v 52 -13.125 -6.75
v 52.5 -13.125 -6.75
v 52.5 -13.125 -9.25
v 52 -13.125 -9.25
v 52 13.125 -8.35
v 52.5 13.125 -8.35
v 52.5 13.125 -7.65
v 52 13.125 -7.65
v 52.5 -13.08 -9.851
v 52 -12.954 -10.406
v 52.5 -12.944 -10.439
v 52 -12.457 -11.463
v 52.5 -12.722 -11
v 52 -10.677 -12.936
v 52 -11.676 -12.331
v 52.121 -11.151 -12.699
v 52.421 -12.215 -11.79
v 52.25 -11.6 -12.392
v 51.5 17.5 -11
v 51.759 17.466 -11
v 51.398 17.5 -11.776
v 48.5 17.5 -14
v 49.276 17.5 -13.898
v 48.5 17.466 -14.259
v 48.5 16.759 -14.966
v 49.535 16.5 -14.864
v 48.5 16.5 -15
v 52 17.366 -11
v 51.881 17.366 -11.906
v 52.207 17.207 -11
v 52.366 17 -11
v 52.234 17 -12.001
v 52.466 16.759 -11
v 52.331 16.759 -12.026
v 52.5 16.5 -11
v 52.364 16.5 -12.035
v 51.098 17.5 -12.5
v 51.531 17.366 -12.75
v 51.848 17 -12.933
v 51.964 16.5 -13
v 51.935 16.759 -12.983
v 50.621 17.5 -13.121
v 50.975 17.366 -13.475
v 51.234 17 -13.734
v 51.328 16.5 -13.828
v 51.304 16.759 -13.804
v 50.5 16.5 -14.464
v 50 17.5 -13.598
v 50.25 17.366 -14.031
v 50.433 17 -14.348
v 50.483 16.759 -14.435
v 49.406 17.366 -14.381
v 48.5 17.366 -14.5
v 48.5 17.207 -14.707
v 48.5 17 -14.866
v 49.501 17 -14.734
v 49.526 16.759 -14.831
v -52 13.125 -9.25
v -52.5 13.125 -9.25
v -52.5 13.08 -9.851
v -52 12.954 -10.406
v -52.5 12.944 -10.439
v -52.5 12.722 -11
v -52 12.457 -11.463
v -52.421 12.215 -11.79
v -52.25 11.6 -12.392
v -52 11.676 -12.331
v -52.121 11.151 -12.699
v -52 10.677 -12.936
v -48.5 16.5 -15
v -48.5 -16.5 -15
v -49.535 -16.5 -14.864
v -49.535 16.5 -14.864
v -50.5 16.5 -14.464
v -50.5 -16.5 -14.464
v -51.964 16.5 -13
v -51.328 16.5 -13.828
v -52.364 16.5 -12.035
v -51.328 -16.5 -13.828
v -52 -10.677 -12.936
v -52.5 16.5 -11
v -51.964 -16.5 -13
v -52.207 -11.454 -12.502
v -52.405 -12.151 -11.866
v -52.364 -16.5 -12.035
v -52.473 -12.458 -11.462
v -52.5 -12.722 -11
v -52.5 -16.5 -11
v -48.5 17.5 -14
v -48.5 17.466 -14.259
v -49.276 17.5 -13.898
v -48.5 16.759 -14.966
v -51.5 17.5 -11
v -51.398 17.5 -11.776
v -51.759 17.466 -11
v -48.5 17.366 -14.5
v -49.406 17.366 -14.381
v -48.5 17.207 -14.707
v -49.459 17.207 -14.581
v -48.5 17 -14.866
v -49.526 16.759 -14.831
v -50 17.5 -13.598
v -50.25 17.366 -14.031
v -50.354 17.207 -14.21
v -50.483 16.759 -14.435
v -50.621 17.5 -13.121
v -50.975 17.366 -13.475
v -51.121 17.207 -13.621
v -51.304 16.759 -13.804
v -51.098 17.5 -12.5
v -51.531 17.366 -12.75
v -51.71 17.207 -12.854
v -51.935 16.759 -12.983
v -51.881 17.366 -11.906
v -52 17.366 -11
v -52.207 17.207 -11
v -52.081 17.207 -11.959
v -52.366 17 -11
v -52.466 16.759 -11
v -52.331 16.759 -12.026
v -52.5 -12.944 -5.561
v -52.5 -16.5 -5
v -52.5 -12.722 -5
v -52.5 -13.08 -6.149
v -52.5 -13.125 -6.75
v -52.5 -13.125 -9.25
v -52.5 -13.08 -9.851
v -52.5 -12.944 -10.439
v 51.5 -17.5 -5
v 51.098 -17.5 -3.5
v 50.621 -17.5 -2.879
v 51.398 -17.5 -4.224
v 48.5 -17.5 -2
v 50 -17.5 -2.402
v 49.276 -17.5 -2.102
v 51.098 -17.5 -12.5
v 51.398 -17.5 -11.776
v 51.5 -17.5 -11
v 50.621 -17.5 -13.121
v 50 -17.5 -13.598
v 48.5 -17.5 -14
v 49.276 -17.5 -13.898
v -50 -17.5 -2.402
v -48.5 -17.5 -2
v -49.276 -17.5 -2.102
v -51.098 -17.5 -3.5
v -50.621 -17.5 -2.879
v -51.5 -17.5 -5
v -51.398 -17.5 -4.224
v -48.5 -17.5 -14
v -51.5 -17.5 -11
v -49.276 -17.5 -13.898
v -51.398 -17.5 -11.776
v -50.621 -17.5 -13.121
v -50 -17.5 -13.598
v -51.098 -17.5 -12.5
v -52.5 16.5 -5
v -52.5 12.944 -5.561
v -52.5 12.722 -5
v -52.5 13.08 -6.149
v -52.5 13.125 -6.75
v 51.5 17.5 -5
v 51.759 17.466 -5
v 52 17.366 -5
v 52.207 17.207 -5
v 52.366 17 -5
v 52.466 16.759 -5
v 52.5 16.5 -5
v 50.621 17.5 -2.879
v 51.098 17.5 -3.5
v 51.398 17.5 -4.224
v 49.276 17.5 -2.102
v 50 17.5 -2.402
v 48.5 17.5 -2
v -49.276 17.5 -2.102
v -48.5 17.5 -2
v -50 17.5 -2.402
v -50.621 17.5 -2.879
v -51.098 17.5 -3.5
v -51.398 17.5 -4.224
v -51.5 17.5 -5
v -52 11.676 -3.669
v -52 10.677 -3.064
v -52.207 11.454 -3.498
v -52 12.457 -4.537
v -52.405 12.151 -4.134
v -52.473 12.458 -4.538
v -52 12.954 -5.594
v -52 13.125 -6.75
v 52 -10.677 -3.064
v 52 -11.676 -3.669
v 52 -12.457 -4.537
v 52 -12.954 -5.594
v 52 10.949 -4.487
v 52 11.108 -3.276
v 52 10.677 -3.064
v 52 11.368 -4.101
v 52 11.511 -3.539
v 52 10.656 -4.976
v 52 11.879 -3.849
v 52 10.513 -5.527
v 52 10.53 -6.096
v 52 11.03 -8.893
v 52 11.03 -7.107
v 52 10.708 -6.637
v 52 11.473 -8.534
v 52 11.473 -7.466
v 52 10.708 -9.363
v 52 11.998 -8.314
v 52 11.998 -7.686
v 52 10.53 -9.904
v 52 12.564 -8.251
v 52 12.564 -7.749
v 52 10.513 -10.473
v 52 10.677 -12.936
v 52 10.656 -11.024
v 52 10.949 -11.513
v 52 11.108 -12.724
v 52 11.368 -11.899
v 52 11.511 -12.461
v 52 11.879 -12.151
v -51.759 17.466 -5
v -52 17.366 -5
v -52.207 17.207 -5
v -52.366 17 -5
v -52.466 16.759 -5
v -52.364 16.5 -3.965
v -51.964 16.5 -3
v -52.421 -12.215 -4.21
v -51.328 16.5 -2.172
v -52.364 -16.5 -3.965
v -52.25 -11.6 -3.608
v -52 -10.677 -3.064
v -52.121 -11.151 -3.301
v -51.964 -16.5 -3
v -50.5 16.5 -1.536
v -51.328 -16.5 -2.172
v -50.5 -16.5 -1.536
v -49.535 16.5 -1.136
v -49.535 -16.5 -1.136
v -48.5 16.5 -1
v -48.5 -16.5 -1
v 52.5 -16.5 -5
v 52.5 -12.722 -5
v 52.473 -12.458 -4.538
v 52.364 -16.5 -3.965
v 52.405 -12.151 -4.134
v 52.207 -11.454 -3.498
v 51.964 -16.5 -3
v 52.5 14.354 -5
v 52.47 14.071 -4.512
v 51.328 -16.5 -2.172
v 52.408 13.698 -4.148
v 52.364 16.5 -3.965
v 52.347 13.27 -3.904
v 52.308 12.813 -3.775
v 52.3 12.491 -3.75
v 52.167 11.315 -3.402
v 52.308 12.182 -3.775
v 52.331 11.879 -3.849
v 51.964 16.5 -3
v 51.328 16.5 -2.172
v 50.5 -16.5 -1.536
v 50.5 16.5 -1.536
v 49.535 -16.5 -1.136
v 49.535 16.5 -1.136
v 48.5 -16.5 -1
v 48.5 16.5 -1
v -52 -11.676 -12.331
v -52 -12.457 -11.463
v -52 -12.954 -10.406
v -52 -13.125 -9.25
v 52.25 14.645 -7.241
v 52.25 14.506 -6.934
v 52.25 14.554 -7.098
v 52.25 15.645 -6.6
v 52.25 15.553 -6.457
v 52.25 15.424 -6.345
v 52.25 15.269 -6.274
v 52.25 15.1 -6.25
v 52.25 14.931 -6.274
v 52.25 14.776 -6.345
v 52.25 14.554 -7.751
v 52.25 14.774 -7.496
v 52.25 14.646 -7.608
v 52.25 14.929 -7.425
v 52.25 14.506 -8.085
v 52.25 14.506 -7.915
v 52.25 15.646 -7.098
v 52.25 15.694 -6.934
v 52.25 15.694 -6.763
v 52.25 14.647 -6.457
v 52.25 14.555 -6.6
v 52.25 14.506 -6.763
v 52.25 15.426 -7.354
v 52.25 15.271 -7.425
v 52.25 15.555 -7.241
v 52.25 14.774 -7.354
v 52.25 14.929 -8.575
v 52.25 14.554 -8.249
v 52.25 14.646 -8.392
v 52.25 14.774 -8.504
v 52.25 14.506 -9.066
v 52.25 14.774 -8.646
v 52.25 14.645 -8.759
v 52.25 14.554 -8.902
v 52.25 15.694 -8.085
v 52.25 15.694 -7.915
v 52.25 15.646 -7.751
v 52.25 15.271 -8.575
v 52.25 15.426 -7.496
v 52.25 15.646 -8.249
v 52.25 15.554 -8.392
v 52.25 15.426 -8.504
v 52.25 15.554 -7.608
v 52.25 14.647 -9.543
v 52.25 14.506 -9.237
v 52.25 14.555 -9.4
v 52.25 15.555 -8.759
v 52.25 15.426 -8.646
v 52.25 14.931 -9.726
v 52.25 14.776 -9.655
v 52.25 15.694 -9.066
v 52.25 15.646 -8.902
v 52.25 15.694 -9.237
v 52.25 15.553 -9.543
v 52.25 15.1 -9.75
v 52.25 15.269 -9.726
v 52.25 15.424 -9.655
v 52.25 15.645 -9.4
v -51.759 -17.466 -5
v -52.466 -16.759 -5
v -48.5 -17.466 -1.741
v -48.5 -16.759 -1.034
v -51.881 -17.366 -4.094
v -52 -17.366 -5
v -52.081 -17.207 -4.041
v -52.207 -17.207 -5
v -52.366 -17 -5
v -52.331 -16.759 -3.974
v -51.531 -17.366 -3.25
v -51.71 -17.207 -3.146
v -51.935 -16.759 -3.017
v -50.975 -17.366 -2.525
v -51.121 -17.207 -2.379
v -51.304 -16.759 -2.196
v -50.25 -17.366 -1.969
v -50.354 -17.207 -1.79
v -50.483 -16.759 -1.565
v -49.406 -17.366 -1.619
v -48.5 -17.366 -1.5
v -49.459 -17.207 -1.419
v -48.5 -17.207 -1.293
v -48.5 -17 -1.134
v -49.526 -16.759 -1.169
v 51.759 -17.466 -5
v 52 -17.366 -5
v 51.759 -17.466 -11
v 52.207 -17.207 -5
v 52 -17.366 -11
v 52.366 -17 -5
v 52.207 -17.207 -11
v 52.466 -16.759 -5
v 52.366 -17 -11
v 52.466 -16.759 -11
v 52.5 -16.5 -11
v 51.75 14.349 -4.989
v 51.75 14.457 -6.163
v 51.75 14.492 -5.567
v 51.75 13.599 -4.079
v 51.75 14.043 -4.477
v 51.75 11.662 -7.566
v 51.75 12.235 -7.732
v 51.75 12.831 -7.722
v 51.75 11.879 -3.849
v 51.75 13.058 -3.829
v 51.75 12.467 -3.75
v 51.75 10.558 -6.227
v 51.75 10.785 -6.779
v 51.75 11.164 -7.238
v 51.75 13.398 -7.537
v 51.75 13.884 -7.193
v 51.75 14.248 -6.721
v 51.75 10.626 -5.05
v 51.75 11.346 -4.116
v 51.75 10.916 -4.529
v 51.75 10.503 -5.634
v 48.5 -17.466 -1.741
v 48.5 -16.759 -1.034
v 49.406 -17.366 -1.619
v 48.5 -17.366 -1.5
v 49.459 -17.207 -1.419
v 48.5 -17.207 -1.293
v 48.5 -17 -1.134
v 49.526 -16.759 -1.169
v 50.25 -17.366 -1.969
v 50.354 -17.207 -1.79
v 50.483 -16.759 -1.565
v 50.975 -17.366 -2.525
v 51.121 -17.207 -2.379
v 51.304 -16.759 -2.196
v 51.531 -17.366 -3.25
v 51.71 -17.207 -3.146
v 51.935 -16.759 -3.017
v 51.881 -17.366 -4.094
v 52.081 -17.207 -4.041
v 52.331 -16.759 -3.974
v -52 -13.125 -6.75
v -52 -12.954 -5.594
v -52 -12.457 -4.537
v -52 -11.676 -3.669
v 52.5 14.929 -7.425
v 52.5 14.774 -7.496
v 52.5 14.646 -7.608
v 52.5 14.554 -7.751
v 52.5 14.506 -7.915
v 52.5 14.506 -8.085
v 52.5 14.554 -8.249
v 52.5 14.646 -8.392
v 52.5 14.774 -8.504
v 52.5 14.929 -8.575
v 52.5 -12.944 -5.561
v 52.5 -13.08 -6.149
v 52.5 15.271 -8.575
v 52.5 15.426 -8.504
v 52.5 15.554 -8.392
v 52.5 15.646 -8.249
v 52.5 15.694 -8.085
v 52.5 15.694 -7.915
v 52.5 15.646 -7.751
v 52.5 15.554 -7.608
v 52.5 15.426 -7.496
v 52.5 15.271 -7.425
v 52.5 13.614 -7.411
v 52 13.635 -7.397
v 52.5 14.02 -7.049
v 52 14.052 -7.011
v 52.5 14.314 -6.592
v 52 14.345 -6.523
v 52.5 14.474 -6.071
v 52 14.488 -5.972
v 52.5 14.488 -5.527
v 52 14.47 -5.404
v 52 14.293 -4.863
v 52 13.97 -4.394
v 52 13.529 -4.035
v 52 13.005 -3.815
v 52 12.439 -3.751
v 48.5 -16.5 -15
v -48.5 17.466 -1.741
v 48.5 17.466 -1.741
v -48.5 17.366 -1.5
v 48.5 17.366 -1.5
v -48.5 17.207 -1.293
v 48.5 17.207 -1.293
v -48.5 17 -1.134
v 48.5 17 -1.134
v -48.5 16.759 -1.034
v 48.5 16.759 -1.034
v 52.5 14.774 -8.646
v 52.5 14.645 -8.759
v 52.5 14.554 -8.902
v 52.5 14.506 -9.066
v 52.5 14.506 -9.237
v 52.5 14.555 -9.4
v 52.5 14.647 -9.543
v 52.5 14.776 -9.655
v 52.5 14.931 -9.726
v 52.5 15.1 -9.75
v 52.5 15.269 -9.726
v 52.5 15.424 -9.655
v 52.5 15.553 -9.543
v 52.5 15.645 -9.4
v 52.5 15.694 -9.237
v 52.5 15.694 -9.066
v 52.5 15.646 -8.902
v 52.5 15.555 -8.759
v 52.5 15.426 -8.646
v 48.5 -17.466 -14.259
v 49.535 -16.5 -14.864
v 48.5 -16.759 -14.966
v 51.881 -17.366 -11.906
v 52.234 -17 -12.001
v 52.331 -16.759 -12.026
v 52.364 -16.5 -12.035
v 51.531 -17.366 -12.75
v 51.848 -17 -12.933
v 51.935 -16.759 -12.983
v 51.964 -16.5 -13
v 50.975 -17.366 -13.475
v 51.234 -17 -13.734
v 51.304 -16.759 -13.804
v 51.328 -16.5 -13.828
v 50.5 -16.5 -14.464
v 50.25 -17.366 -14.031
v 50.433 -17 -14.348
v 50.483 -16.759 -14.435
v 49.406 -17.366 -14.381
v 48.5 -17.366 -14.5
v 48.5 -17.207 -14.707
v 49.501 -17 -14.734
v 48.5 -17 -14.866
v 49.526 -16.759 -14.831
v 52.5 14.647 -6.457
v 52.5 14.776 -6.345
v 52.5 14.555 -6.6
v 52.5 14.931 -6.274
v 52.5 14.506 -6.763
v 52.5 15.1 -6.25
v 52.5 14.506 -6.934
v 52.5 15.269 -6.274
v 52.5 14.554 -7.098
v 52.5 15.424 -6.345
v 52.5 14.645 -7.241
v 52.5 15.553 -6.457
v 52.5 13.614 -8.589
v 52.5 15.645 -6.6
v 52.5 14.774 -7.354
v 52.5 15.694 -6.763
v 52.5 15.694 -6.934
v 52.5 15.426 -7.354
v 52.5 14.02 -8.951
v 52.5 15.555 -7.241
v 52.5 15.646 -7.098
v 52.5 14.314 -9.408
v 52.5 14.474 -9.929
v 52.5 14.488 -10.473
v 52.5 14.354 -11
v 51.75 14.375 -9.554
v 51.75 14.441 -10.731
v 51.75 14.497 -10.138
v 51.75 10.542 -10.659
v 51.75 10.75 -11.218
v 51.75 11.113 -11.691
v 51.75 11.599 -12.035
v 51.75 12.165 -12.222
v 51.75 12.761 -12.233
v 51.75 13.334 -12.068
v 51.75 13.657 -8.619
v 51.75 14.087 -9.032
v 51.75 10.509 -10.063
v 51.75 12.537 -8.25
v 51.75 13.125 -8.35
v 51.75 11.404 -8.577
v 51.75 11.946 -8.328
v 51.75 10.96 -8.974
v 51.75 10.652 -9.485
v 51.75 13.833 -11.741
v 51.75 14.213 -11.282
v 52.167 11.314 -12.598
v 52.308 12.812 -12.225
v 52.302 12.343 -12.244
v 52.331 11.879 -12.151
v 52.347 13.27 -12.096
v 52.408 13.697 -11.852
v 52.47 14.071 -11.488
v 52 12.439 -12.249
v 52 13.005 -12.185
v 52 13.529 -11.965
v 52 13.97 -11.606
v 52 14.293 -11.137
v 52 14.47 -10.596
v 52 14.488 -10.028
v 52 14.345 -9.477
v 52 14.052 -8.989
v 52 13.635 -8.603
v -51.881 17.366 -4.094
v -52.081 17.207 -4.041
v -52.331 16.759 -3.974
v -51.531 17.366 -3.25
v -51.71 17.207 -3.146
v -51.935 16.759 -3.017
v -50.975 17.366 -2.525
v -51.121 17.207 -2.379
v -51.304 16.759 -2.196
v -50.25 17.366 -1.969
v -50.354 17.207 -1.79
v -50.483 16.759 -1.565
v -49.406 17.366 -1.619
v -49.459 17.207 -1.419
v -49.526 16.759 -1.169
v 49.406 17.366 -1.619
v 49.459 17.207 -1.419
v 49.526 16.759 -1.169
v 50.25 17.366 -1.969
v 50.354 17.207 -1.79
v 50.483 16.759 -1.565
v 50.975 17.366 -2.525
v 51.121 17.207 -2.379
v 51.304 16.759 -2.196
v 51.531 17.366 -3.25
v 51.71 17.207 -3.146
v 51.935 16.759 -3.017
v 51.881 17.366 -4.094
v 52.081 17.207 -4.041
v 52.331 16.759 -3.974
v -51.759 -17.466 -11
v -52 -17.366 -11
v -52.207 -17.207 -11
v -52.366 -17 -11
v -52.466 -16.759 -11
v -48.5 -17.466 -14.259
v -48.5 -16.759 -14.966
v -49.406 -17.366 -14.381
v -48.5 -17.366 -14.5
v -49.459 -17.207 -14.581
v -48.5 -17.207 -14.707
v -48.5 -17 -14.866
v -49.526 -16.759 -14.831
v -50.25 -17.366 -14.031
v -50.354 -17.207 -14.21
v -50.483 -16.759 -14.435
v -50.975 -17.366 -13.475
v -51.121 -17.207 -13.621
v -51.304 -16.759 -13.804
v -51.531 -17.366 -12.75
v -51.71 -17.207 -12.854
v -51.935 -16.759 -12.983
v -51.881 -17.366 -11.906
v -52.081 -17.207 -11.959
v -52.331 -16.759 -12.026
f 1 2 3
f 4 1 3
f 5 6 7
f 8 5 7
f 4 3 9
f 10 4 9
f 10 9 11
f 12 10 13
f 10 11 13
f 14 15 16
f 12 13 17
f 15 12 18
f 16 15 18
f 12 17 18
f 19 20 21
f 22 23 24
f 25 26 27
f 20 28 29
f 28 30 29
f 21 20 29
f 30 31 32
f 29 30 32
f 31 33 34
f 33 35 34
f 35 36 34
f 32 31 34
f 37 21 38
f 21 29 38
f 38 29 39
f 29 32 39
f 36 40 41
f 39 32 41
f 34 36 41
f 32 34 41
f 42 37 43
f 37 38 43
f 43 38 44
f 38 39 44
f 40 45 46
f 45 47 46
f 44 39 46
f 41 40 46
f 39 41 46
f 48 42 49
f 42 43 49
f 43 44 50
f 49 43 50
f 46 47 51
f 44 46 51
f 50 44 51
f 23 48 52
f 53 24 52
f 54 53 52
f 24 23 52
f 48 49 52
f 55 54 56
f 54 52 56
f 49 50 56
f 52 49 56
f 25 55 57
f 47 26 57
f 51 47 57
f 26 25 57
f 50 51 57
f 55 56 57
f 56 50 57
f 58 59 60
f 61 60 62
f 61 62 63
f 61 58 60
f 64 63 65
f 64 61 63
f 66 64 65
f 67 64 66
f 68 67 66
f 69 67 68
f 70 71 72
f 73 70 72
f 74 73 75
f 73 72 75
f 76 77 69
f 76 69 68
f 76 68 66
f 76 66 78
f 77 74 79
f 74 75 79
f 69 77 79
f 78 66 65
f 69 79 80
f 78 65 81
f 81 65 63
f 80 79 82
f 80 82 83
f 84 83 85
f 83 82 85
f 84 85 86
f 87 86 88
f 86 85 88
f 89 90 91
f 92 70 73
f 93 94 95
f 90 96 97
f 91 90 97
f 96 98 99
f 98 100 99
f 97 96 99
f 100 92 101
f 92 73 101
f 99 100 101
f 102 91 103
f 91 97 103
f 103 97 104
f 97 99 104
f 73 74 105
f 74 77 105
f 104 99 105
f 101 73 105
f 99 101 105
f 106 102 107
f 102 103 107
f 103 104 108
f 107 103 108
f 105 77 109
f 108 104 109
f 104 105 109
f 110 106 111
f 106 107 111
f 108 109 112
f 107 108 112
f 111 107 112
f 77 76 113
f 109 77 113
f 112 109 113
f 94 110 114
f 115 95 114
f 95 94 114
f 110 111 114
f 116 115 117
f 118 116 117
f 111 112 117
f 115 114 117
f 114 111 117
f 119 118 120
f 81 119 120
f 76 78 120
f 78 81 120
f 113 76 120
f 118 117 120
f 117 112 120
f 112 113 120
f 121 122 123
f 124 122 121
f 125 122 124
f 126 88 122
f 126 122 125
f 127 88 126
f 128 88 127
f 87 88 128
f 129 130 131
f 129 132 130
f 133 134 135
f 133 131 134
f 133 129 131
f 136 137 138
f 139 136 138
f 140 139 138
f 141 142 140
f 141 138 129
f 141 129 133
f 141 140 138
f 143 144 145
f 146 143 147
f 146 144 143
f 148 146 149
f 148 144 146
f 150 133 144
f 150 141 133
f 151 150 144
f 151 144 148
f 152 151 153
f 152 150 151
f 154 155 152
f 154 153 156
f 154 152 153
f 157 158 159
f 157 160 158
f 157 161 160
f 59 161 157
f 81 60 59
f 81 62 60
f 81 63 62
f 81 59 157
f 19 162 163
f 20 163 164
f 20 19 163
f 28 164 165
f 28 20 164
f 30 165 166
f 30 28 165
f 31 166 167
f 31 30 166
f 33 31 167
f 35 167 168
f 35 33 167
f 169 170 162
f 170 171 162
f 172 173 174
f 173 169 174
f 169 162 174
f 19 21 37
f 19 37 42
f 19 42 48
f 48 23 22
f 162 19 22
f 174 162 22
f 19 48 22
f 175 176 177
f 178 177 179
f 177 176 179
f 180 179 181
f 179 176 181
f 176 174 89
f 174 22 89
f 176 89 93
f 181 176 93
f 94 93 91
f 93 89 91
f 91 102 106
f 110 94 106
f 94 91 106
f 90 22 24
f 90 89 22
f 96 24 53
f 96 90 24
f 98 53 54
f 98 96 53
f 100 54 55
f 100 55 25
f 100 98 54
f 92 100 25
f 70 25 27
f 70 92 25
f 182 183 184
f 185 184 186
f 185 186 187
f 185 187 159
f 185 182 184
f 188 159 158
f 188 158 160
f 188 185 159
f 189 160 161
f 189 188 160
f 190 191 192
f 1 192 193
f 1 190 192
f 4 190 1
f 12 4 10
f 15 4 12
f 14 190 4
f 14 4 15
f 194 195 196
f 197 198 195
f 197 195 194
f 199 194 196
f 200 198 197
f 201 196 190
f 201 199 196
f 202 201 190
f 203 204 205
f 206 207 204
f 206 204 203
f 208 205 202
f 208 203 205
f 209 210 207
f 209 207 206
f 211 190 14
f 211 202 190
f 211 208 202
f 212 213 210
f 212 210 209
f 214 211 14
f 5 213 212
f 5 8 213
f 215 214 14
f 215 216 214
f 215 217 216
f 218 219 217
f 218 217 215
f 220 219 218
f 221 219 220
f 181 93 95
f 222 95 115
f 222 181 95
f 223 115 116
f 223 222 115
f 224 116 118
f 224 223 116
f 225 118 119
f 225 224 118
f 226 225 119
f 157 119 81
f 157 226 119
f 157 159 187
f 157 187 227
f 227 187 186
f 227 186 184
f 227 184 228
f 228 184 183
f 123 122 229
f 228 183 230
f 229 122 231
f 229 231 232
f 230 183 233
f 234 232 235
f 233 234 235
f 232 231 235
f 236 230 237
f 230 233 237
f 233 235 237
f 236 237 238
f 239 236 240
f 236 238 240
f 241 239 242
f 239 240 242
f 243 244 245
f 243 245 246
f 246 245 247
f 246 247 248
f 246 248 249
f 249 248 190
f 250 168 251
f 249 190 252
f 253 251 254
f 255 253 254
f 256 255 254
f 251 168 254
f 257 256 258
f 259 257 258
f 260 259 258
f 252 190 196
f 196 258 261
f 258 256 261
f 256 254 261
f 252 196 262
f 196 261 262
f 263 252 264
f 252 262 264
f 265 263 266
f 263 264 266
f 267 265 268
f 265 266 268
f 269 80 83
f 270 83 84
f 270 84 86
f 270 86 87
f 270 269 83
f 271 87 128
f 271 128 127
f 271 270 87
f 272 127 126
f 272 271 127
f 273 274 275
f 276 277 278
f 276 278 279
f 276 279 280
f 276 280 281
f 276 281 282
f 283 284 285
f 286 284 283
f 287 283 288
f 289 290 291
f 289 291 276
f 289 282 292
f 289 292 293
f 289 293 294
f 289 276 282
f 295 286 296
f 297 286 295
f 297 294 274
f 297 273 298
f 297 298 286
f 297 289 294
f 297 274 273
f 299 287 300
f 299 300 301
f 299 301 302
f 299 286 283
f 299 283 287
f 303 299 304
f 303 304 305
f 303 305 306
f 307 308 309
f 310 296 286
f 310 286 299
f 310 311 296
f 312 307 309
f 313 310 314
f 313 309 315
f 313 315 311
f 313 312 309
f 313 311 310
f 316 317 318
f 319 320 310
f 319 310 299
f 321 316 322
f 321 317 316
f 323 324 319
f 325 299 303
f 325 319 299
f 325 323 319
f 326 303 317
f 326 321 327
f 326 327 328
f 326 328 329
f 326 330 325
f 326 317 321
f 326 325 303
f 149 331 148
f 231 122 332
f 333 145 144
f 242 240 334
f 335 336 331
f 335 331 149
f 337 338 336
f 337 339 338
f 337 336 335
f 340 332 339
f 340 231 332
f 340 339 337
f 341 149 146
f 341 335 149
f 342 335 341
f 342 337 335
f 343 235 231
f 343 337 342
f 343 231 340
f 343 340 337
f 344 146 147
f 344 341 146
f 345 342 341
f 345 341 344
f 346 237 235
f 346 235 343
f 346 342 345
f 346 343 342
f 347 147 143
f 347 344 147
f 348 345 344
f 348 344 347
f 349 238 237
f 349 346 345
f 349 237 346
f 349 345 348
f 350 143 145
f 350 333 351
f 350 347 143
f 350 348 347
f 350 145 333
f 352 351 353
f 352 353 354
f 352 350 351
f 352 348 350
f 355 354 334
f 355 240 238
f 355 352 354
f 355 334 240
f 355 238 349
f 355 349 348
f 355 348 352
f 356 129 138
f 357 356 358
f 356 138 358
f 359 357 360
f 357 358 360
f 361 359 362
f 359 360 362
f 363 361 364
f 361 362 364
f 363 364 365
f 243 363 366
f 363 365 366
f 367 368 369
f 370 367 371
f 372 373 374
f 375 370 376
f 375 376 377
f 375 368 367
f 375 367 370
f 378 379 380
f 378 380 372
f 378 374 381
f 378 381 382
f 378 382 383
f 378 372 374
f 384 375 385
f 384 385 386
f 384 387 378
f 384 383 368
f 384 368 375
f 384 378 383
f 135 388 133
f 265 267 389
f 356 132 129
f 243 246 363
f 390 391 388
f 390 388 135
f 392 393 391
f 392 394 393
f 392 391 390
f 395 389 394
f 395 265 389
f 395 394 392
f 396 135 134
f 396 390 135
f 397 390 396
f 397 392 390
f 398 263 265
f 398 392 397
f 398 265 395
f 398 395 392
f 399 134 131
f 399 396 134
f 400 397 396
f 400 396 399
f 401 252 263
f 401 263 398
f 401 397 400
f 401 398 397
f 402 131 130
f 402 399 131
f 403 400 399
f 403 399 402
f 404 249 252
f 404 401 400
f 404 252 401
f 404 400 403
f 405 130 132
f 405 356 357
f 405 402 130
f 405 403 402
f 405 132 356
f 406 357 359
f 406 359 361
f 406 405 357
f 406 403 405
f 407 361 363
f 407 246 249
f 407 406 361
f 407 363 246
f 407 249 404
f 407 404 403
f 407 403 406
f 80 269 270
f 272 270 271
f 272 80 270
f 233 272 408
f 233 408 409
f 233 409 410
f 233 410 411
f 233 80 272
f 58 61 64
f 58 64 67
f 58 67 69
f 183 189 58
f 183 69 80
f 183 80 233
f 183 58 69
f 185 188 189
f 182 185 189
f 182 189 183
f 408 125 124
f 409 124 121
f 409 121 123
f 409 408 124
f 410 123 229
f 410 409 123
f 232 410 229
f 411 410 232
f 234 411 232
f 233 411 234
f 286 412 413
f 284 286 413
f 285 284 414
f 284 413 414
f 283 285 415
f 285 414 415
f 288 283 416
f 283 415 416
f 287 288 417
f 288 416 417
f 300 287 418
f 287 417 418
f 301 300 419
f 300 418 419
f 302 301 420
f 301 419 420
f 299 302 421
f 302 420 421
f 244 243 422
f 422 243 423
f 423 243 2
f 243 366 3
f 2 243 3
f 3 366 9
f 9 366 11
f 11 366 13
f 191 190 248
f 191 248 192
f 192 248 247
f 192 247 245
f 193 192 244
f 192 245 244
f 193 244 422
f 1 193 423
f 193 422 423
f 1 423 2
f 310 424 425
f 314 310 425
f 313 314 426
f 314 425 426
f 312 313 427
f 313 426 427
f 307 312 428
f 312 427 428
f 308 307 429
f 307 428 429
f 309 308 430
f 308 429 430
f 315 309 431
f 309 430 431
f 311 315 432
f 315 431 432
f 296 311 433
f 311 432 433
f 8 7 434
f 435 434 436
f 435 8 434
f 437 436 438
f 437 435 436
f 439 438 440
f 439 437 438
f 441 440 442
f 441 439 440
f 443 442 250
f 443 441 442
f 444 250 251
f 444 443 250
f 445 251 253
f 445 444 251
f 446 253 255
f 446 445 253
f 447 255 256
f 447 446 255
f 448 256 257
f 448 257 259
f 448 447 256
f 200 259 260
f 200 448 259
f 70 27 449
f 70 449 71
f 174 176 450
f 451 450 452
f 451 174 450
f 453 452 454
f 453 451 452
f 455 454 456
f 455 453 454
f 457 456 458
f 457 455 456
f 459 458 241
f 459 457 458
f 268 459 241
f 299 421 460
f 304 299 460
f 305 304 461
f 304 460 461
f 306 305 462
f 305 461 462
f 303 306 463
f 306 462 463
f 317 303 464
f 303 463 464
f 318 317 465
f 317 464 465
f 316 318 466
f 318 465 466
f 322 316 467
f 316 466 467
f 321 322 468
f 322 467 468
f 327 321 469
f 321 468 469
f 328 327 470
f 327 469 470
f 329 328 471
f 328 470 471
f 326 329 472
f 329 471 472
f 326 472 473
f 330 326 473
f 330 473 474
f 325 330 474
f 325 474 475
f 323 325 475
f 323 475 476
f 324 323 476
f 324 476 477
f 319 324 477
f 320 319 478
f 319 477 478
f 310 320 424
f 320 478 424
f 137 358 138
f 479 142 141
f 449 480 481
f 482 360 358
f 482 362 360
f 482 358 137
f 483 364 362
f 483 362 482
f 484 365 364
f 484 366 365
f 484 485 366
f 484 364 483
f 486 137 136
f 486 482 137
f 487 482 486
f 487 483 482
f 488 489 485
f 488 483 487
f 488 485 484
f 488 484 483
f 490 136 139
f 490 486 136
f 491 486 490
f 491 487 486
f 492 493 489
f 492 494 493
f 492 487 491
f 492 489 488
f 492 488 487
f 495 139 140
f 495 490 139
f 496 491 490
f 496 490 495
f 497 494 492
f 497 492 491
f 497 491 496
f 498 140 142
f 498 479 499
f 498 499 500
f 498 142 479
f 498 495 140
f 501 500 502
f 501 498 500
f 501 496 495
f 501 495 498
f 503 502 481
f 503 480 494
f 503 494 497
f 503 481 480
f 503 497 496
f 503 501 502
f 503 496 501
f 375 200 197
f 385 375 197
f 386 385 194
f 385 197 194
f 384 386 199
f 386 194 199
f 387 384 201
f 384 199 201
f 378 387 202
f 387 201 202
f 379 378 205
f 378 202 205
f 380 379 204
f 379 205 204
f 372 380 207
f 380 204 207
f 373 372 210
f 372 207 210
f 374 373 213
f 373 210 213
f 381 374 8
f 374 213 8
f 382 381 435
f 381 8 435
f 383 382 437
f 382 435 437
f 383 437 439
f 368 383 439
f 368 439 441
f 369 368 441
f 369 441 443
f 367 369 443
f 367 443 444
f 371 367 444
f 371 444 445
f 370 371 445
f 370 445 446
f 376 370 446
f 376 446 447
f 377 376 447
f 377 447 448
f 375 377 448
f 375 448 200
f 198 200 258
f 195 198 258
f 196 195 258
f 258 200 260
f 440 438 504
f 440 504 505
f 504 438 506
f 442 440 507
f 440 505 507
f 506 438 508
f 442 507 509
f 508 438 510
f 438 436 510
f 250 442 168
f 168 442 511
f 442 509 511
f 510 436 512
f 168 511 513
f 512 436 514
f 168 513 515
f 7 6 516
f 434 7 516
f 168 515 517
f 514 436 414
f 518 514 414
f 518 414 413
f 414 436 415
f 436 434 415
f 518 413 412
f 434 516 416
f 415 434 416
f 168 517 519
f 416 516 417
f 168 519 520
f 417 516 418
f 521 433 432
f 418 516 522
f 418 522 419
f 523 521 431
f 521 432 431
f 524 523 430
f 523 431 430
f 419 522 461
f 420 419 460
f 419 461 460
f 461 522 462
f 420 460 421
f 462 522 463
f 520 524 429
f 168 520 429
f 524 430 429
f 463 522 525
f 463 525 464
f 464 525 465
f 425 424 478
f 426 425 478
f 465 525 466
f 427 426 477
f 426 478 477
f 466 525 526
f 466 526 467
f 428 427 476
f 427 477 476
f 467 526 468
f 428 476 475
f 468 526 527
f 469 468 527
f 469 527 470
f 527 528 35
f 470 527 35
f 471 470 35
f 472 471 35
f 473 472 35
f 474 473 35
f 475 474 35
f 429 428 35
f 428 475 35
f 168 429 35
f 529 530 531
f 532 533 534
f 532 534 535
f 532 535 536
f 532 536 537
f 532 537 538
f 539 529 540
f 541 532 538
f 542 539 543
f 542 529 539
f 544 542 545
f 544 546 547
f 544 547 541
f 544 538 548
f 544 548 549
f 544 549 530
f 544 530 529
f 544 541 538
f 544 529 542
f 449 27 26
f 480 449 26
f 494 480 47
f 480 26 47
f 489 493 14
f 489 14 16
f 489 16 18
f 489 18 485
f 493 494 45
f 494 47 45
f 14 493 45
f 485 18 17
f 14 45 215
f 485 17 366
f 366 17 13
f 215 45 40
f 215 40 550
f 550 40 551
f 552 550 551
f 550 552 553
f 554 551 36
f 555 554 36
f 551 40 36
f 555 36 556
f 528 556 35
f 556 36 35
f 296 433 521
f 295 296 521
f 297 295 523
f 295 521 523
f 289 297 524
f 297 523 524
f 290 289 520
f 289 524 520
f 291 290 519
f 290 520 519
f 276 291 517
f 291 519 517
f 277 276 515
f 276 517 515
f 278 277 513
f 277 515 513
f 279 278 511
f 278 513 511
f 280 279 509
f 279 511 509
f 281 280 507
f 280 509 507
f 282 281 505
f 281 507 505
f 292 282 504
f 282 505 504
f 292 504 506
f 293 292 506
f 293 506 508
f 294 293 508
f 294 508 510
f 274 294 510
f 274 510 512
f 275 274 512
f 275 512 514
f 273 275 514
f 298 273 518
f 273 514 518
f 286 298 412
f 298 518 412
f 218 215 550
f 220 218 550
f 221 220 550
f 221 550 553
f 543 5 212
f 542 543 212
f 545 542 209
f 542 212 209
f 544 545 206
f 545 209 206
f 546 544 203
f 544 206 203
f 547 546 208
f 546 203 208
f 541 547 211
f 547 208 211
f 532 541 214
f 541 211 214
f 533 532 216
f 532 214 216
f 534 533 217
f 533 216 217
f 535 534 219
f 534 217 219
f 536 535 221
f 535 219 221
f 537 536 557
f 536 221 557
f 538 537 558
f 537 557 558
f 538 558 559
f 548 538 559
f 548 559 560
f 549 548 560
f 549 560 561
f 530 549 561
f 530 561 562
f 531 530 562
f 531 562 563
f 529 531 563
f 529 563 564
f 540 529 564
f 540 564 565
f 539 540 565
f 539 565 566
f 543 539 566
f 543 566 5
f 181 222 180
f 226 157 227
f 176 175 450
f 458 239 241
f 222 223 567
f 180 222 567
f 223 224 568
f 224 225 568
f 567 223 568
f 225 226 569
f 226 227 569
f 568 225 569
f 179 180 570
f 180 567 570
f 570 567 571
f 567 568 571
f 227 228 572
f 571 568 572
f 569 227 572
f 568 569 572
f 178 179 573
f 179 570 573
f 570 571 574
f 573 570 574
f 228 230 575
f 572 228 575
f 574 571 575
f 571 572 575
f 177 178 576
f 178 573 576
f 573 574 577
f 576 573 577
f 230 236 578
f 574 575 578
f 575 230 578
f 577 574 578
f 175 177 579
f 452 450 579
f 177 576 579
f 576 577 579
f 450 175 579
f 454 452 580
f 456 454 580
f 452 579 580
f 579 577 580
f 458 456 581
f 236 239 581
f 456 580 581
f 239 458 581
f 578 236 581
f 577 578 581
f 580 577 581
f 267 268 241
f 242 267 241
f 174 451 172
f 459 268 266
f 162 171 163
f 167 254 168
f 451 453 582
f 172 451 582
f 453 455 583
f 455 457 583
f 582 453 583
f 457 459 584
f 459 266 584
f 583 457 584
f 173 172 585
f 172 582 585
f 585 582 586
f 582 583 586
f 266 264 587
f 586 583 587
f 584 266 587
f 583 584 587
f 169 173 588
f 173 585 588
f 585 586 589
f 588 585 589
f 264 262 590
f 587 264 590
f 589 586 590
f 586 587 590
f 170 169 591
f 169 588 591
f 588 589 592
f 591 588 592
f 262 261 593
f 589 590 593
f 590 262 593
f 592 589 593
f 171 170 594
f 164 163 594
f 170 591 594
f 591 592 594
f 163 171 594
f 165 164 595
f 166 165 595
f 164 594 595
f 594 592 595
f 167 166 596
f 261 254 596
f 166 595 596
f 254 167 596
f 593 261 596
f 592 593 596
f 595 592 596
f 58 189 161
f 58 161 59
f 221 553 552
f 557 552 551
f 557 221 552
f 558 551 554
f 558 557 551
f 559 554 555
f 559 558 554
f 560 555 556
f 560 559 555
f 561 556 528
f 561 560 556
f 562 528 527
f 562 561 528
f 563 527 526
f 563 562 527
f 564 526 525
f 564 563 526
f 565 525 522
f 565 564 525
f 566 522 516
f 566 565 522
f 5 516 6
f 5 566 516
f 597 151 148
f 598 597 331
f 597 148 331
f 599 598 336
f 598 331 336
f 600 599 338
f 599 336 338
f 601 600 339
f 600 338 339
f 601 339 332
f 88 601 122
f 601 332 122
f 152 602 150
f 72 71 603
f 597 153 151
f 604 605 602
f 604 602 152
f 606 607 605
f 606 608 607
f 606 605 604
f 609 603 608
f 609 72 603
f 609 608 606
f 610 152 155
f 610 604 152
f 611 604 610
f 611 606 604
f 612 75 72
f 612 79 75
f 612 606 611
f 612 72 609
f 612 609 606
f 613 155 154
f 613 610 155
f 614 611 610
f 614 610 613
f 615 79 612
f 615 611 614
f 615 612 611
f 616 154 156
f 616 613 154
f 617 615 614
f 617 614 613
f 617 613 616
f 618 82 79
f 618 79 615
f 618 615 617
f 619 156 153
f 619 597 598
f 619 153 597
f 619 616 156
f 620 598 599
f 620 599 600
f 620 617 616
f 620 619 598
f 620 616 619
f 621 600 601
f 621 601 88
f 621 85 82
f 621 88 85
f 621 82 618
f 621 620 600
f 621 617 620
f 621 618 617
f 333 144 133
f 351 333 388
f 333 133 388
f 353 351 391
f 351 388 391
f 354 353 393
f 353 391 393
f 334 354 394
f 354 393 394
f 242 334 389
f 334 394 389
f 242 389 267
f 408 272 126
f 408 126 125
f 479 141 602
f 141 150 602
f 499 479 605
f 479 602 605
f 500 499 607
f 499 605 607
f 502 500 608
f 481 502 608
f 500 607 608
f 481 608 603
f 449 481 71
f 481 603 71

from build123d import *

# Parameters (mm, degrees)
SKETCH1_W                           = 105
SKETCH1_H                           = 35
BOSS_EXTRUDE1_DEPTH                 = 14
CUT_EXTRUDE1_DEPTH                  = 0.5
CUT_EXTRUDE2_START                  = -0.5
CUT_EXTRUDE2_DEPTH                  = 0.5
FILLET1_R                           = 4
FILLET2_R                           = 1
ESQUISSE1_R                         = 2
ENL_V_MAT_EXTRU_1_DEPTH             = 0.25
ENL_V_MAT_EXTRU_1_DIRECTION_2_REACH = 109.012
ENL_V_MAT_EXTRU_4_DEPTH             = 0.25


with BuildPart() as part:
    # Sketch1 → Boss-Extrude1 (new body)
    with BuildSketch(Plane(origin=(0, 0, -15), x_dir=(-1, 0, 0), z_dir=(0, 0, -1))):
        Rectangle(SKETCH1_W, SKETCH1_H)
    extrude(amount=-BOSS_EXTRUDE1_DEPTH)

    # Sketch2 → Cut-Extrude1 (cut)
    with BuildSketch(Plane(origin=(52.5, 0, 0), x_dir=(0, 0, -1), z_dir=(1, 0, 0))):
        with BuildLine():
            Line((2.75, 9.125), (2.75, -9.125))
            ThreePointArc((2.75, -9.125), (3.921572875, -11.953427125), (6.75, -13.125))
            Line((6.75, -13.125), (9.25, -13.125))
            ThreePointArc((9.25, -13.125), (12.078427125, -11.953427125), (13.25, -9.125))
            Line((13.25, -9.125), (13.25, 9.125))
            ThreePointArc((13.25, 9.125), (12.078427125, 11.953427125), (9.25, 13.125))
            Line((9.25, 13.125), (6.75, 13.125))
            ThreePointArc((6.75, 13.125), (3.921572875, 11.953427125), (2.75, 9.125))
        make_face()
    extrude(amount=-CUT_EXTRUDE1_DEPTH, mode=Mode.SUBTRACT)

    # Sketch3 → Cut-Extrude2 (cut)
    with BuildSketch(Plane.ZY.offset(52.5).offset(CUT_EXTRUDE2_START)):
        with BuildLine():
            Line((-6.75, 13.125), (-9.25, 13.125))
            ThreePointArc((-9.25, 13.125), (-12.078427125, 11.953427125), (-13.25, 9.125))
            Line((-13.25, 9.125), (-13.25, -9.125))
            ThreePointArc((-13.25, -9.125), (-12.078427125, -11.953427125), (-9.25, -13.125))
            Line((-9.25, -13.125), (-6.75, -13.125))
            ThreePointArc((-6.75, -13.125), (-3.921572875, -11.953427125), (-2.75, -9.125))
            Line((-2.75, -9.125), (-2.75, 9.125))
            ThreePointArc((-2.75, 9.125), (-3.921572875, 11.953427125), (-6.75, 13.125))
        make_face()
    extrude(amount=CUT_EXTRUDE2_DEPTH, mode=Mode.SUBTRACT)

    # Fillet1
    # the kernel refuses this fillet: 4 mm, written as the material it takes off along each edge
    with BuildSketch(Plane(origin=(-52.5, -27.5, -15), x_dir=(0, 0, 1), z_dir=(0, 1, 0)), Plane(origin=(52.5, 27.5, -15), x_dir=(0, 0, 1), z_dir=(0, -1, 0))) as fillet1_piece_1:
        with BuildLine():
            CenterArc((FILLET1_R, FILLET1_R), FILLET1_R, 180, 90)
            Line((0, FILLET1_R), (0, 0))
            Line((0, 0), (FILLET1_R, 0))
        make_face()
    extrude(amount=55, mode=Mode.SUBTRACT)
    with BuildSketch(Plane(origin=(-52.5, -27.5, -1), x_dir=(0, 0, -1), z_dir=(0, 1, 0)), Plane(origin=(52.5, 27.5, -1), x_dir=(0, 0, -1), z_dir=(0, -1, 0))) as fillet1_piece_2:
        with BuildLine():
            CenterArc((FILLET1_R, -FILLET1_R), FILLET1_R, 90, 90)
            Line((0, -FILLET1_R), (0, 0))
            Line((0, 0), (FILLET1_R, 0))
        make_face()
    extrude(amount=55, mode=Mode.SUBTRACT)

    # Fillet2
    fillet2_edges = [part.edges().sort_by_distance(p)[0] for p in [
        (0, -17.5, -15),
        (0, 17.5, -15),
        (-52.5, 17.5, -8),
        (0, 17.5, -1),
        (52.5, 17.5, -8),
        (51.328427125, 17.5, -2.171572875),
        (51.328427125, 17.5, -13.828427125),
        (-51.328427125, 17.5, -2.171572875),
        (-51.328427125, 17.5, -13.828427125),
        (-52.5, -17.5, -8),
        (52.5, -17.5, -8),
        (0, -17.5, -1),
        (51.328427125, -17.5, -2.171572875),
        (51.328427125, -17.5, -13.828427125),
        (-51.328427125, -17.5, -2.171572875),
        (-51.328427125, -17.5, -13.828427125),
    ]]
    fillet(fillet2_edges, radius=FILLET2_R)

    # Esquisse1 → Enlèv. mat.-Extru.1 (cut)
    with BuildSketch(Plane(origin=(52, 0, 0), x_dir=(0, 0, -1), z_dir=(1, 0, 0))):
        with Locations(Location((5.75, 12.5, 0), (0, 0, 198.094122224))):
            Circle(ESQUISSE1_R)
        with Locations(Location((10.25, 12.5, 0), (0, 0, 161.790043136))):
            Circle(ESQUISSE1_R)
    extrude(amount=-ENL_V_MAT_EXTRU_1_DEPTH, mode=Mode.SUBTRACT)

    # Esquisse1 → Enlèv. mat.-Extru.1 direction 2 (cut, up to next)
    with BuildSketch(Plane(origin=(52, 0, 0), x_dir=(0, 0, -1), z_dir=(1, 0, 0)), mode=Mode.PRIVATE) as enl_v_mat_extru_1_direction_2_sk1:
        with Locations(Location((5.75, 12.5, 0), (0, 0, 198.094122224))):
            Circle(ESQUISSE1_R)
    enl_v_mat_extru_1_direction_2_tool1 = extrude(enl_v_mat_extru_1_direction_2_sk1.sketch, amount=ENL_V_MAT_EXTRU_1_DIRECTION_2_REACH, mode=Mode.PRIVATE) & part.part
    # Esquisse1 → Enlèv. mat.-Extru.1 direction 2 (cut, up to next)
    with BuildSketch(Plane(origin=(52, 0, 0), x_dir=(0, 0, -1), z_dir=(1, 0, 0)), mode=Mode.PRIVATE) as enl_v_mat_extru_1_direction_2_sk2:
        with Locations(Location((10.25, 12.5, 0), (0, 0, 161.790043136))):
            Circle(ESQUISSE1_R)
    enl_v_mat_extru_1_direction_2_tool2 = extrude(enl_v_mat_extru_1_direction_2_sk2.sketch, amount=ENL_V_MAT_EXTRU_1_DIRECTION_2_REACH, mode=Mode.PRIVATE) & part.part
    add(enl_v_mat_extru_1_direction_2_tool1.solids().sort_by_distance((52, 12.5, -5.75))[0], mode=Mode.SUBTRACT)
    add(enl_v_mat_extru_1_direction_2_tool2.solids().sort_by_distance((52, 12.5, -10.25))[0], mode=Mode.SUBTRACT)

    # Esquisse2 → Enlèv. mat.-Extru.4 (cut)
    with BuildSketch(Plane(origin=(52.5, 0, 0), x_dir=(0, 0, -1), z_dir=(1, 0, 0))):
        with BuildLine():
            ThreePointArc((7.425, 14.928608635), (8, 14.5), (8.575, 14.928608635))
            ThreePointArc((8.575, 14.928608635), (9.75, 15.1), (8.575, 15.271391365))
            ThreePointArc((8.575, 15.271391365), (8, 15.7), (7.425, 15.271391365))
            ThreePointArc((7.425, 15.271391365), (6.25, 15.1), (7.425, 14.928608635))
        make_face()
    extrude(amount=-ENL_V_MAT_EXTRU_4_DEPTH, mode=Mode.SUBTRACT)


solid = part.part
